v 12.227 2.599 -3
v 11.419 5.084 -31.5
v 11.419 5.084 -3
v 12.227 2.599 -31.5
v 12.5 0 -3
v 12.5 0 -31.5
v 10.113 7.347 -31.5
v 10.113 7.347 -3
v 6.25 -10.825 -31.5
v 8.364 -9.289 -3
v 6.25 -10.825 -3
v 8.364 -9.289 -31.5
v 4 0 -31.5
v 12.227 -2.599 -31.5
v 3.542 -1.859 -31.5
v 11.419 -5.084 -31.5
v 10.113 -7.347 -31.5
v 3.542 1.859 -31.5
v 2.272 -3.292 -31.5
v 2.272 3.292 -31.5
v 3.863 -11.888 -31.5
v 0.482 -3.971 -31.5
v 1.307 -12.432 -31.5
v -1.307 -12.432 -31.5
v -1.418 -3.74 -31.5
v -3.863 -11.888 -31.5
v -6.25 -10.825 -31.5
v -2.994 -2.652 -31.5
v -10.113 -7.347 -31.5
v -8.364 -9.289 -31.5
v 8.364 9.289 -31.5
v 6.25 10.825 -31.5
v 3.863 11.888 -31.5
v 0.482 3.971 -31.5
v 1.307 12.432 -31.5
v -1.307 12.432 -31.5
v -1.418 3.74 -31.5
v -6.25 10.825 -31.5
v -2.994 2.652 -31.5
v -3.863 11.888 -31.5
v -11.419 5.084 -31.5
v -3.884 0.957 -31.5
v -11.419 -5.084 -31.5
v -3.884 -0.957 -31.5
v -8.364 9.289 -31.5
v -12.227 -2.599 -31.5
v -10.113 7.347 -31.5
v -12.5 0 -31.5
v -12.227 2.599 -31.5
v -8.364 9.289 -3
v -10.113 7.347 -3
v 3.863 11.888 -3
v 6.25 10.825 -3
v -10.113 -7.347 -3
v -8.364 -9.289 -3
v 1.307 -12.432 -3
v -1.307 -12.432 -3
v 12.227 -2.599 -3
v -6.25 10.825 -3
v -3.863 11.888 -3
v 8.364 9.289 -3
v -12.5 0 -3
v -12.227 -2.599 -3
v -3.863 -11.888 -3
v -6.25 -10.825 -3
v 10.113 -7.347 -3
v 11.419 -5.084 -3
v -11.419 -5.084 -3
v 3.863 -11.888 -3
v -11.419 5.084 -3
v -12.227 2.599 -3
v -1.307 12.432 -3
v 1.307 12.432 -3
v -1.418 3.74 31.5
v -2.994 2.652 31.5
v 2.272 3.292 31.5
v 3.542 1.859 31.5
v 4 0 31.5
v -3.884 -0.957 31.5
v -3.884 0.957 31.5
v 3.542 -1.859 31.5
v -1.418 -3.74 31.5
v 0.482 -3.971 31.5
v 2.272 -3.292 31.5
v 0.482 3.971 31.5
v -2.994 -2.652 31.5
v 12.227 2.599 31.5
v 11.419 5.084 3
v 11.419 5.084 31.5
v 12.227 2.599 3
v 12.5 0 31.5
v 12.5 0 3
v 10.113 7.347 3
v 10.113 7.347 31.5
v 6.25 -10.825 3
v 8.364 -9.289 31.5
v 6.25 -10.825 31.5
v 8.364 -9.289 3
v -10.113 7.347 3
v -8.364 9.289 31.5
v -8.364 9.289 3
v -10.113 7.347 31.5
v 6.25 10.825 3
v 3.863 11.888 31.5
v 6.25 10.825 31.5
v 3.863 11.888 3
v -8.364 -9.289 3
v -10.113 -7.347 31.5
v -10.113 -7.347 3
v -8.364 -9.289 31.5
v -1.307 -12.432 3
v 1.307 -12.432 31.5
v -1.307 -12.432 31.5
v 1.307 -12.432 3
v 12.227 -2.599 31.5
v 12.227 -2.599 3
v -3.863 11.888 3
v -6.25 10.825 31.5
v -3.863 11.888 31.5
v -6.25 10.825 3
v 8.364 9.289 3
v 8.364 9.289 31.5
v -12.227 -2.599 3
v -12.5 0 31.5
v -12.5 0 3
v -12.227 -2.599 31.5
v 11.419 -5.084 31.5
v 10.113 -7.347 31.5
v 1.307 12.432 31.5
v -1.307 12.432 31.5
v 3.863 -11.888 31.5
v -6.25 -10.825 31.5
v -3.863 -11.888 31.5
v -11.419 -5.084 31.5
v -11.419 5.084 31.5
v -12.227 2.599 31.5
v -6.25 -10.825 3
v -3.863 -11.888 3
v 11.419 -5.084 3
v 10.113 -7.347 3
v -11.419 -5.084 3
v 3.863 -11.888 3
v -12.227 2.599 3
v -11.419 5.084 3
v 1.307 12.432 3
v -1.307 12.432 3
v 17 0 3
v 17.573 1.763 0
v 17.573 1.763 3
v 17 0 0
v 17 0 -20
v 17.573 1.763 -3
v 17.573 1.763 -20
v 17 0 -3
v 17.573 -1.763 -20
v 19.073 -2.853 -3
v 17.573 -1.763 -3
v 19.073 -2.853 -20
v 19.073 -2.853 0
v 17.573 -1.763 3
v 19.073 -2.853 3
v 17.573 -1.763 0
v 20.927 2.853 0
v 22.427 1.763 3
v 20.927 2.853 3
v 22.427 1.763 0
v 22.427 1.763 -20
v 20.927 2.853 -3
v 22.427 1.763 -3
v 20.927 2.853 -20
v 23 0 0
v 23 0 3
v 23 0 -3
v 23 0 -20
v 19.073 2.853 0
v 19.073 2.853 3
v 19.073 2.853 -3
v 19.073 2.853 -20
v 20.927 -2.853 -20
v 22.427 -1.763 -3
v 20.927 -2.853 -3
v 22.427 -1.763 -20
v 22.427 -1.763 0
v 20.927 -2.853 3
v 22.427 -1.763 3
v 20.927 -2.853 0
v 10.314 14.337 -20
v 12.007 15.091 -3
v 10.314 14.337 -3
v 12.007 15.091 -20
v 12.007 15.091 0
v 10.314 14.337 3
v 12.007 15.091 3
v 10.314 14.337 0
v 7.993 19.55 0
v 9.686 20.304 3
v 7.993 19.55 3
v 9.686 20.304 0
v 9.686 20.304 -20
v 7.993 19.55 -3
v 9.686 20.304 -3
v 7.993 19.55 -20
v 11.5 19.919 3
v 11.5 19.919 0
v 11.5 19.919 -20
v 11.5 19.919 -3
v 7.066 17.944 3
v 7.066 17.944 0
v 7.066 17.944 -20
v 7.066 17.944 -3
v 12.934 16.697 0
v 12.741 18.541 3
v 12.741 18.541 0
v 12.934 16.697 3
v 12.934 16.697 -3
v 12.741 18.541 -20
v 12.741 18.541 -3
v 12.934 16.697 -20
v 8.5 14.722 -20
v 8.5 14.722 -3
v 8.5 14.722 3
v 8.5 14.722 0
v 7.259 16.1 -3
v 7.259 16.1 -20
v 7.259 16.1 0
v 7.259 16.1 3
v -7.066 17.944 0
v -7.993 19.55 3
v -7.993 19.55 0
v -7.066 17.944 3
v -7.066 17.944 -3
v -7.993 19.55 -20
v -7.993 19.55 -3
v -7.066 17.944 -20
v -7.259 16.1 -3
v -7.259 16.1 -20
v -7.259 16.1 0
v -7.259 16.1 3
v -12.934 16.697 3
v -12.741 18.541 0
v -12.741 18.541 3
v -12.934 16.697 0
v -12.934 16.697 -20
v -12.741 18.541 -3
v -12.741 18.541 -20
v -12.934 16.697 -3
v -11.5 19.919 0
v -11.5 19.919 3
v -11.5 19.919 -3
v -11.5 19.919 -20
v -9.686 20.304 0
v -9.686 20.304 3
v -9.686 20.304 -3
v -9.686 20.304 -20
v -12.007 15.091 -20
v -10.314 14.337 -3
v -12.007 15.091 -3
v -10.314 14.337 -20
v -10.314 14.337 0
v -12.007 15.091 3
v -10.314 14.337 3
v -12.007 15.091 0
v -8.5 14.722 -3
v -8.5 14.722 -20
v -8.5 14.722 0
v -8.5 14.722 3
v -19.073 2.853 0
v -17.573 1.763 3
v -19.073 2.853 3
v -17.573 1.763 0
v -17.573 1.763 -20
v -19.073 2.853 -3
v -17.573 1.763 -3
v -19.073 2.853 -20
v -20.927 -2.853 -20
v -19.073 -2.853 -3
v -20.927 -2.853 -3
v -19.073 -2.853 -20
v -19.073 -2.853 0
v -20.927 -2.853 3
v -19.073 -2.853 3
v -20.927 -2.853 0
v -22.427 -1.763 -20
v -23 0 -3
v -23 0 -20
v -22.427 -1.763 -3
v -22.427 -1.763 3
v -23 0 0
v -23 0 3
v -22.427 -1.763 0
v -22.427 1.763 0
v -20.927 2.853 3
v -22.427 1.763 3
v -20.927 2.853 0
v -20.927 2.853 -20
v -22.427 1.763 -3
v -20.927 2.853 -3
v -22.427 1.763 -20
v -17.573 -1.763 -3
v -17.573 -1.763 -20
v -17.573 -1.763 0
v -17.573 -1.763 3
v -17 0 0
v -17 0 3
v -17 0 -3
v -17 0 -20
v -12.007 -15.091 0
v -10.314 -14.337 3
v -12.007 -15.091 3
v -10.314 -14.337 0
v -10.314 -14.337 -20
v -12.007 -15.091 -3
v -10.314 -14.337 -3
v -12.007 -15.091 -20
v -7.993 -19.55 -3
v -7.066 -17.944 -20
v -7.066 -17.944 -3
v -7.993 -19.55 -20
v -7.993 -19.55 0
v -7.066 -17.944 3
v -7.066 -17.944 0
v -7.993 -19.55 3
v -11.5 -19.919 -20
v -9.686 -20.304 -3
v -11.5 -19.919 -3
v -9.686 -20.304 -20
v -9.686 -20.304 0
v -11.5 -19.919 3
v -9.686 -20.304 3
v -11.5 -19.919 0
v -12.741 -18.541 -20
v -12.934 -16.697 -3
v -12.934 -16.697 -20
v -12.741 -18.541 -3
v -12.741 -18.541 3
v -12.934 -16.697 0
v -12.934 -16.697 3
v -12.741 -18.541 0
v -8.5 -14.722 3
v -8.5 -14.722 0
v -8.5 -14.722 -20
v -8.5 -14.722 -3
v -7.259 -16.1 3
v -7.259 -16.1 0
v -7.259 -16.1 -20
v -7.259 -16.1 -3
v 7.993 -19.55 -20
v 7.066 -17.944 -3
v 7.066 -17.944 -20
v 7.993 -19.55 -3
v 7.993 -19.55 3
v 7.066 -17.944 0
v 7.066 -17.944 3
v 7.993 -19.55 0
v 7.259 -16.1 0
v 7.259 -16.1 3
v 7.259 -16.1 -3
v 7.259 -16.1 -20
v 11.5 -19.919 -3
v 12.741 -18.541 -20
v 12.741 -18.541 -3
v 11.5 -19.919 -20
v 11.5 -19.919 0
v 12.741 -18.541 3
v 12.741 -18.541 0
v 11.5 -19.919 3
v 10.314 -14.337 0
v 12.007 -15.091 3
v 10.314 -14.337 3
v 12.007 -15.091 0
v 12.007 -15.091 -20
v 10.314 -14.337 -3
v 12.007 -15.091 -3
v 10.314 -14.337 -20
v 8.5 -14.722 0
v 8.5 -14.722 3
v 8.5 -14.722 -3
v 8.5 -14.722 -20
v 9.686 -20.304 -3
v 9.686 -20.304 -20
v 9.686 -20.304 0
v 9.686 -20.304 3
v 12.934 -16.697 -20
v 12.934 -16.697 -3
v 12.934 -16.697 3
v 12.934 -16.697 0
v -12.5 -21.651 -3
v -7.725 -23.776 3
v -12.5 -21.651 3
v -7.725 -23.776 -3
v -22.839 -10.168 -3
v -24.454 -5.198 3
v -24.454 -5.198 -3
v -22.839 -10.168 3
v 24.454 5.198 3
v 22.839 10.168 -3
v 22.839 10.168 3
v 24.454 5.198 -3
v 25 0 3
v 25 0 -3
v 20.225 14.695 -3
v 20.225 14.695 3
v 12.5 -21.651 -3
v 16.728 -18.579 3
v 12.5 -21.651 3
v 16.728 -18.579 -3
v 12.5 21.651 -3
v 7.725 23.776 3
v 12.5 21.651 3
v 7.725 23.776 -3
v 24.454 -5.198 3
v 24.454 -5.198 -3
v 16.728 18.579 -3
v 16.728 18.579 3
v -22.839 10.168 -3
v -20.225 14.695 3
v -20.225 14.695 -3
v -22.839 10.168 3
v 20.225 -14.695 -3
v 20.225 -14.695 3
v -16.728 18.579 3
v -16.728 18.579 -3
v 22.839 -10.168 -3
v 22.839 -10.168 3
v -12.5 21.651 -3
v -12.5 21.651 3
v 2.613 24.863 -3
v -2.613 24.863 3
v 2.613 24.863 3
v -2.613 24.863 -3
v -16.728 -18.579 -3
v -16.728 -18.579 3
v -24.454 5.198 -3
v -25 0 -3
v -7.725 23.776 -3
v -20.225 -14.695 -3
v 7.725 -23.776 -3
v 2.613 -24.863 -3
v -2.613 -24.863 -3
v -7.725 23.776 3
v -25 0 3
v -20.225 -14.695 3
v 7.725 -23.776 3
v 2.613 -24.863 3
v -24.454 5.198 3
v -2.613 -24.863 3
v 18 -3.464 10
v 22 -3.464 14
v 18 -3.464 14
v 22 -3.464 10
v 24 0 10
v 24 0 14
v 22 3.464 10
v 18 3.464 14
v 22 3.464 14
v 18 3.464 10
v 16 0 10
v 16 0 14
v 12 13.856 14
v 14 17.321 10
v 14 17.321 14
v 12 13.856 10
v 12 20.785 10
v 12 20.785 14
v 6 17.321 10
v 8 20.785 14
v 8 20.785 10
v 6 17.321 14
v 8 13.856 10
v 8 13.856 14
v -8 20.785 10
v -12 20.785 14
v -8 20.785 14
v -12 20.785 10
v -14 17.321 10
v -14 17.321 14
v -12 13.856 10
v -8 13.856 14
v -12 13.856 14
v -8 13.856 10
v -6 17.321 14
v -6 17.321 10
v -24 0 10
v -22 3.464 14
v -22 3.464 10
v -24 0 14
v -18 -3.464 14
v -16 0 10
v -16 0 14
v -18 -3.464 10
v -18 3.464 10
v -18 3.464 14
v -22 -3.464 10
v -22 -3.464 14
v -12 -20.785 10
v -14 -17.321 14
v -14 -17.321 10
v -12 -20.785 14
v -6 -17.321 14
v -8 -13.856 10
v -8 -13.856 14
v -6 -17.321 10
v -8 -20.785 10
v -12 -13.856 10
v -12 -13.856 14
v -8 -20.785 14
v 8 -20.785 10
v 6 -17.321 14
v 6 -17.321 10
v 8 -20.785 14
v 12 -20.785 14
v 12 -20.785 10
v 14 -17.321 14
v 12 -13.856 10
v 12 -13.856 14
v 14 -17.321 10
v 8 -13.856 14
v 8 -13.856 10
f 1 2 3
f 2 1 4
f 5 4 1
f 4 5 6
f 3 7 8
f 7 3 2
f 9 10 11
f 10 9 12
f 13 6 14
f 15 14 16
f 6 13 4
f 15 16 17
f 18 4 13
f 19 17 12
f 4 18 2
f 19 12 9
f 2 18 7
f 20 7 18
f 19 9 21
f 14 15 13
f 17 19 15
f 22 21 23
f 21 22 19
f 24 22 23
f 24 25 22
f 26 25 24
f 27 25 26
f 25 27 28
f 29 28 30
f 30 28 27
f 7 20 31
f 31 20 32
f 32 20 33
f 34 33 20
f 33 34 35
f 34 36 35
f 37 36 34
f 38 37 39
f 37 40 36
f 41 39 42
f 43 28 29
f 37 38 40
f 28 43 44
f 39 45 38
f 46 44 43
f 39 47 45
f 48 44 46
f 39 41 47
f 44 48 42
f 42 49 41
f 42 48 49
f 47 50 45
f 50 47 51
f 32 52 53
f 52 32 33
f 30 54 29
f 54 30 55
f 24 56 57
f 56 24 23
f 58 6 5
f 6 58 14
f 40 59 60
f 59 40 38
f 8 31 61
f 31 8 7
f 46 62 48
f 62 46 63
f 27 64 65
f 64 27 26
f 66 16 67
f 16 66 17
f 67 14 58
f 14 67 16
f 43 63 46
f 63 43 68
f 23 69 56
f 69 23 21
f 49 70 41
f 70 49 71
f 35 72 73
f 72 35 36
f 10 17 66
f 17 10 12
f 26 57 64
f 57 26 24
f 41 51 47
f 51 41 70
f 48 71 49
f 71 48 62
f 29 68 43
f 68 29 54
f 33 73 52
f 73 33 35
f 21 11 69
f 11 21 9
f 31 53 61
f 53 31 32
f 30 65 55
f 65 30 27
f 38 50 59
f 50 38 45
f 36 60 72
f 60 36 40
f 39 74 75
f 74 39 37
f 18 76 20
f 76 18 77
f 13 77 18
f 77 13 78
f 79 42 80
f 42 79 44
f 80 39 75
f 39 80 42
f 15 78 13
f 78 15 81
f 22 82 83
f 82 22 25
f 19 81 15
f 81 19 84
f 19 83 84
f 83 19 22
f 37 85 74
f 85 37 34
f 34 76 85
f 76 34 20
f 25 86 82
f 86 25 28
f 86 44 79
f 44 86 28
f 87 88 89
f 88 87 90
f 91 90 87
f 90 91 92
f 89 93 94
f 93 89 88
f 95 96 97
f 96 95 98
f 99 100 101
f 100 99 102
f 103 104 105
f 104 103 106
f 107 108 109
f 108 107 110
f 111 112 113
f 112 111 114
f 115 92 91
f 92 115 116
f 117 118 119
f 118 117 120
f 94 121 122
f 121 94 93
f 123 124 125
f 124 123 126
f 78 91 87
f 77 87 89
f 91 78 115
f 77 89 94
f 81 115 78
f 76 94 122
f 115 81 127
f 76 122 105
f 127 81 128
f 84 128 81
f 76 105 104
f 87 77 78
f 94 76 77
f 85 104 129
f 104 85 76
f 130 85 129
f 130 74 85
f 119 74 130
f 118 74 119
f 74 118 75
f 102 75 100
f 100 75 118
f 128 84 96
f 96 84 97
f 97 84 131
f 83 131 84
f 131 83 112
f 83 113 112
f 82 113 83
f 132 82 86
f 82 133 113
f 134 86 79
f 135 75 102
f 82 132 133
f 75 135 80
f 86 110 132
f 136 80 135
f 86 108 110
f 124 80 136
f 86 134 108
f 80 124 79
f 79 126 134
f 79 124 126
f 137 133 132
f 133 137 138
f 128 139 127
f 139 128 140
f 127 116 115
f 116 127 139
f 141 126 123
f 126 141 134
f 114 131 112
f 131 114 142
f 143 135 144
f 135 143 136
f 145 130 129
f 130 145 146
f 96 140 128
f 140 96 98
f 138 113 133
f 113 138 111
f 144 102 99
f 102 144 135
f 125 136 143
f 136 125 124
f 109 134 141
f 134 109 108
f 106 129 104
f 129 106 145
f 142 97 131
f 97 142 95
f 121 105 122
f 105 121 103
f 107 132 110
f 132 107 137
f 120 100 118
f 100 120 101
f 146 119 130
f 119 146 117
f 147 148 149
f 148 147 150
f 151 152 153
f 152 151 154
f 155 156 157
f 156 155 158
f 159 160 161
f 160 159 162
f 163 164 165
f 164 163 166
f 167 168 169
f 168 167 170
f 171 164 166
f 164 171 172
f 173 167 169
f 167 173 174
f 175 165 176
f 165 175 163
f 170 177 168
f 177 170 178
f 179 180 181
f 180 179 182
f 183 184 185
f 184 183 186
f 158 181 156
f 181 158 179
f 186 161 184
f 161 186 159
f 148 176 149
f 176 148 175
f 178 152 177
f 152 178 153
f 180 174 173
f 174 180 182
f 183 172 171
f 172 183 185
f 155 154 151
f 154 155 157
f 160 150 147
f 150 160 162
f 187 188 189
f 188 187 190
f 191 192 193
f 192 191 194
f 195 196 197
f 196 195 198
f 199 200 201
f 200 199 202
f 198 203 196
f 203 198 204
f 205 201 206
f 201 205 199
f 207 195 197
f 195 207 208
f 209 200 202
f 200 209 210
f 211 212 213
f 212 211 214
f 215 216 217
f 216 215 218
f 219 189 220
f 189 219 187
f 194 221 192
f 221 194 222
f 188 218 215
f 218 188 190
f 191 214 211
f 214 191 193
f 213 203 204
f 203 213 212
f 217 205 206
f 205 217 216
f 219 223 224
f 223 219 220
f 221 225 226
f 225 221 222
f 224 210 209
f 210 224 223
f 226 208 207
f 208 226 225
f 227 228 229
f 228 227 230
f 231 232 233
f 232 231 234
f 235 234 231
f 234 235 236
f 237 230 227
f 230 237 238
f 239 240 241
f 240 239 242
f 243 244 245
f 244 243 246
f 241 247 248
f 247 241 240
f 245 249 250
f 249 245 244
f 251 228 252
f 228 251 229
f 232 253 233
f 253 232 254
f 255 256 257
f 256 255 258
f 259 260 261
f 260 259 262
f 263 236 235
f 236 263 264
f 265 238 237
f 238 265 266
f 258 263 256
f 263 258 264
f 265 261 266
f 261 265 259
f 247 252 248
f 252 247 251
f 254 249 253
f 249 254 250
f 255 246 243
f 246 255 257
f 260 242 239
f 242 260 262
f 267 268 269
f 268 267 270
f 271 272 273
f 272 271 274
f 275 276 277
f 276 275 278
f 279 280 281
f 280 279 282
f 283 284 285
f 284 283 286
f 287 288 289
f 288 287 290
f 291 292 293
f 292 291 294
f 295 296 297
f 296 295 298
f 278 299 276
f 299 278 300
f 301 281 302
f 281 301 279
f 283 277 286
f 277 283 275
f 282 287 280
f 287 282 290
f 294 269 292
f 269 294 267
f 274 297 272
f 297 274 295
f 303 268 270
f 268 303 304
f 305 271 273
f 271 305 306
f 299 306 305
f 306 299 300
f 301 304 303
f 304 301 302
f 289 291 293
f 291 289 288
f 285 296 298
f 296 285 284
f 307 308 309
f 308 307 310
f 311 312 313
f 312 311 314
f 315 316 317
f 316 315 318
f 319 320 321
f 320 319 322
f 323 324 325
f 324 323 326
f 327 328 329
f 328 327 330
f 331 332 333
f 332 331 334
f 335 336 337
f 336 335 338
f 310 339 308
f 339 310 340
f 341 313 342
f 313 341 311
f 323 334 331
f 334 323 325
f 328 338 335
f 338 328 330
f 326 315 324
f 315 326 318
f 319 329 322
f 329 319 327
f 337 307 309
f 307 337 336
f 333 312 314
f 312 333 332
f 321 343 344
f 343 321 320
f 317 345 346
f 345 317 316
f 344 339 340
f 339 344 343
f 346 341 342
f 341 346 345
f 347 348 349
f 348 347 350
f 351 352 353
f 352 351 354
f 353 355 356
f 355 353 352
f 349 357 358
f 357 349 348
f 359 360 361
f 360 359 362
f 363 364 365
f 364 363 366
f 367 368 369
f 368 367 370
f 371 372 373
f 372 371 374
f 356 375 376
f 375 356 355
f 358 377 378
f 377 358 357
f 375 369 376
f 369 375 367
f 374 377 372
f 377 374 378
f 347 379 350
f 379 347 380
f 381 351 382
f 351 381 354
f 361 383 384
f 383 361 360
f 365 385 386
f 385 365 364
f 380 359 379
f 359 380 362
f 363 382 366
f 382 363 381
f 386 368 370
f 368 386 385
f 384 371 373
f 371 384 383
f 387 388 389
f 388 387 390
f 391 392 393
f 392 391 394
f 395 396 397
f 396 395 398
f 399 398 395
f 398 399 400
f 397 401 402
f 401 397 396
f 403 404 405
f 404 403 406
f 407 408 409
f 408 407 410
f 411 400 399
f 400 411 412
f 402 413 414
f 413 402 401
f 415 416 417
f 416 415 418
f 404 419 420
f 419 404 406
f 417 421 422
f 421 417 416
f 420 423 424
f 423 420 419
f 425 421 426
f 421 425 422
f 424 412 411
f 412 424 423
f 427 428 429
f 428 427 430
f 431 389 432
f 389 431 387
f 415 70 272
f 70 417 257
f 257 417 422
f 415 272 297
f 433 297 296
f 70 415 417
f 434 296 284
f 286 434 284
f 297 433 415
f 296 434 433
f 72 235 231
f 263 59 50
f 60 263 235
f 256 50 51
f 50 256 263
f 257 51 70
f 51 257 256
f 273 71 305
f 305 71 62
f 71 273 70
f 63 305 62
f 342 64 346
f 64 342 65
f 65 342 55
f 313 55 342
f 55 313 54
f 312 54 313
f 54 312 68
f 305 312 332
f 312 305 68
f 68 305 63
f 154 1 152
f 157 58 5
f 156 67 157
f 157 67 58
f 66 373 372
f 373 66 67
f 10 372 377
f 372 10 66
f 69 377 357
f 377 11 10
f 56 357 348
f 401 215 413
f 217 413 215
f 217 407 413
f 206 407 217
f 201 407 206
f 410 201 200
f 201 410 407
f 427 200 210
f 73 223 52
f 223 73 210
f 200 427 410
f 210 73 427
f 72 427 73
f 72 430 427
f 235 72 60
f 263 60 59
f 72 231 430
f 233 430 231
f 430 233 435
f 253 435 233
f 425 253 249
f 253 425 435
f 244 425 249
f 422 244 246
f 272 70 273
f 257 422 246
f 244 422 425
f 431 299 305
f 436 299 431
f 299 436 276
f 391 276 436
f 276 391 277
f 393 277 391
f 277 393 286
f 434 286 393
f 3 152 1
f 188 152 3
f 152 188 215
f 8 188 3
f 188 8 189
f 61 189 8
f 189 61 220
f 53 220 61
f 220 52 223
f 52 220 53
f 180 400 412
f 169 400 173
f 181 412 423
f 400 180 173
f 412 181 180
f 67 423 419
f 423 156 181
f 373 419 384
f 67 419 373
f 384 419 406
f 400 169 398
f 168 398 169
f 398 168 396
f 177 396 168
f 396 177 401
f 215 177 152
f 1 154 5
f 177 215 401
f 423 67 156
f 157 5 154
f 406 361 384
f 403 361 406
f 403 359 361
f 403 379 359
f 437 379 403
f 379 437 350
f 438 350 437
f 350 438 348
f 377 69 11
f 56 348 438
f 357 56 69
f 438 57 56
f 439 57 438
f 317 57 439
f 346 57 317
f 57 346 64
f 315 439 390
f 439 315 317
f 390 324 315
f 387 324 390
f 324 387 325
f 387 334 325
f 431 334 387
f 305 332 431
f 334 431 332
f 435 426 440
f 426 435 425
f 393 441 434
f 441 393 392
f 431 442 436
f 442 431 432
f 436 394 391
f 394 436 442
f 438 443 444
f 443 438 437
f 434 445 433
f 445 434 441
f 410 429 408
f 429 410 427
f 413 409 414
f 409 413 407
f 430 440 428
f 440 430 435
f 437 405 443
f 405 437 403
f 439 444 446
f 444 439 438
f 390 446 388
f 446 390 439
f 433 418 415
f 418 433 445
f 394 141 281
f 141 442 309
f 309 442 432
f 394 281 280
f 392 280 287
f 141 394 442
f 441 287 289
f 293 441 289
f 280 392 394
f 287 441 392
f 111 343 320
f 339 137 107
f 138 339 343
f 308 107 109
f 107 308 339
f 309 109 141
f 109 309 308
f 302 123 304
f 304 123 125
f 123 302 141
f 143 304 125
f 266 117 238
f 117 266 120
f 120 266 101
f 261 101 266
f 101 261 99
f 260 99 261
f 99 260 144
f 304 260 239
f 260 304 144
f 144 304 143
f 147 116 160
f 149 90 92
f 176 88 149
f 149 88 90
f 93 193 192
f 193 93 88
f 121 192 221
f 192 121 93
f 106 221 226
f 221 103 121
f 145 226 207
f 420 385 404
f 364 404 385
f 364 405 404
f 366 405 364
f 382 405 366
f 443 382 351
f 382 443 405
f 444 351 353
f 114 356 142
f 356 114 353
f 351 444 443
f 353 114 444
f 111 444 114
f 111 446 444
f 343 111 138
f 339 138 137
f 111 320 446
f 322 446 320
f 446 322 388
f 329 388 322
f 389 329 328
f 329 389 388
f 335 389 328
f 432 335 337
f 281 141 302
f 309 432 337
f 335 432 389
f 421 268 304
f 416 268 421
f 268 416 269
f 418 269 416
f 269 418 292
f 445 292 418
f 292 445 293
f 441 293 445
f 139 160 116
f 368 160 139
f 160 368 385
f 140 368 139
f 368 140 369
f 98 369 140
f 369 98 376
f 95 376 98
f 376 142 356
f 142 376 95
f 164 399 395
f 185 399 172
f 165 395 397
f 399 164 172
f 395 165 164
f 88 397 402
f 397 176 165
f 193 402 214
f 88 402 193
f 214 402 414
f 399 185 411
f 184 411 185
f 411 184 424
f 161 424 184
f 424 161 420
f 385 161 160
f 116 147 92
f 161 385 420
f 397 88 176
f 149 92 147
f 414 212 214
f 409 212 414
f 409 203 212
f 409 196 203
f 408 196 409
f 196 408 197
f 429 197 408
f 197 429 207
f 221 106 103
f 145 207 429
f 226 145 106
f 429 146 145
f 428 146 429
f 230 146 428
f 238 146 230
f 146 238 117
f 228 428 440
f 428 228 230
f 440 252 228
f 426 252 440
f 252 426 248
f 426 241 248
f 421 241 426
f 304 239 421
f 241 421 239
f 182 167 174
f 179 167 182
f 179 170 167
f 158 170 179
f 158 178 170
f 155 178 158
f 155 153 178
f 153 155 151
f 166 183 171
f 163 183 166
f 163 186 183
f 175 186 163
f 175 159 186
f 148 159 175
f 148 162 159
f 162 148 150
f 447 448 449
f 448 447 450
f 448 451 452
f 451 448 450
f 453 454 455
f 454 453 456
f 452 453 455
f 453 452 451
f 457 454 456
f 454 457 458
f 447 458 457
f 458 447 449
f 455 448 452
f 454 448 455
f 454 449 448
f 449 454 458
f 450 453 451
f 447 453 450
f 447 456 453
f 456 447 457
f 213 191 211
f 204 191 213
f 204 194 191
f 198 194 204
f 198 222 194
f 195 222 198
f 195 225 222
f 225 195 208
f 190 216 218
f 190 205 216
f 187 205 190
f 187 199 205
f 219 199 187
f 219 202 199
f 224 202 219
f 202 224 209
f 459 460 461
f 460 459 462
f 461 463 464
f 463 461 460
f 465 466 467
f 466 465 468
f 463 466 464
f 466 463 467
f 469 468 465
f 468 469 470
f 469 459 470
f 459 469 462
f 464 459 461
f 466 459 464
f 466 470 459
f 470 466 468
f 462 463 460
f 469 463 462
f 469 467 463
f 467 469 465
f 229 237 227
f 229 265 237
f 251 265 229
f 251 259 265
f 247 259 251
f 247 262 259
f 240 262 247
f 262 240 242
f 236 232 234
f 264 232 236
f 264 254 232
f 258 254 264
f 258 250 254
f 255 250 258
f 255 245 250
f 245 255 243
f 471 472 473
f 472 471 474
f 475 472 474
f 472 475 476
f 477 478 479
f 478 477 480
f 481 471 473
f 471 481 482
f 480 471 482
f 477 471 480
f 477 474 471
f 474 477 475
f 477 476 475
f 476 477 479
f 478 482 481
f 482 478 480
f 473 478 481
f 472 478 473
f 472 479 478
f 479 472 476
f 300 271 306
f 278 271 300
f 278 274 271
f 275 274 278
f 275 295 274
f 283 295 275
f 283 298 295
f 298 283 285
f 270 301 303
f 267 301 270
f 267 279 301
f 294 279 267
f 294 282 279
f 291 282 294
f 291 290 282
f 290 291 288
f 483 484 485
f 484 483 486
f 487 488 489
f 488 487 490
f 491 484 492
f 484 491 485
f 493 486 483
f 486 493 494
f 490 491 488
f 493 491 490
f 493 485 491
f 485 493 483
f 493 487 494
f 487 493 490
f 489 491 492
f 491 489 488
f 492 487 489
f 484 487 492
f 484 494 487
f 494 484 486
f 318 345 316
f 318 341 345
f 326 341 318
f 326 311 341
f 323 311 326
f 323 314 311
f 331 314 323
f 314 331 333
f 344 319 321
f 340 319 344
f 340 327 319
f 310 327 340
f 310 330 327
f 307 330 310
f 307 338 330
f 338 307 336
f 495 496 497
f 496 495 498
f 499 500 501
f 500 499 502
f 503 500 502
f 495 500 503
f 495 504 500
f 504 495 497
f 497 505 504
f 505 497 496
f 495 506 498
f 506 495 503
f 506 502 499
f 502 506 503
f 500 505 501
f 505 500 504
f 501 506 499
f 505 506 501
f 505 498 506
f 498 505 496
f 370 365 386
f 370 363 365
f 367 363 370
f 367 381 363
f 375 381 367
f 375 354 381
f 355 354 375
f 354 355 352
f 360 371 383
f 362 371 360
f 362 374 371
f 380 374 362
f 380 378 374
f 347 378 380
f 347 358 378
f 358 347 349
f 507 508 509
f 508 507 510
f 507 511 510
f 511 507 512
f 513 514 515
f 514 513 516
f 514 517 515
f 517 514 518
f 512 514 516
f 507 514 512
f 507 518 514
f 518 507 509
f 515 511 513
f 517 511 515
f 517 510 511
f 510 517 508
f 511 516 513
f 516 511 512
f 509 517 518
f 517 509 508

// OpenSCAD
// Parameters
shaft_length = 30; // Shortened shaft
shaft_diameter = 25; // Increased diameter
shaft_hole_diameter = 8;

flange_diameter = 50;
flange_thickness = 3; // Thinner flange
flange_hole_diameter = 8;
bolt_hole_radius = 3;
bolt_spacing_radius = 20;

diaphragm_thickness = 2; // Ensure diaphragm is present

bolt_length = 20; // Shortened bolts
bolt_diameter = 6;
nut_size = 8; // More compact nuts

// Shaft Module
module shaft() {
    difference() {
        cylinder(h = shaft_length, d = shaft_diameter, center = true);
        cylinder(h = shaft_length + 2, d = shaft_hole_diameter, center = true);
    }
}

// Flange Module
module flange() {
    difference() {
        cylinder(h = flange_thickness, d = flange_diameter, center = true);
        cylinder(h = flange_thickness + 2, d = flange_hole_diameter, center = true);
        for (i = [0:60:360]) {
            rotate([0, 0, i])
            translate([bolt_spacing_radius, 0, 0])
            cylinder(h = flange_thickness + 2, d = bolt_hole_radius * 2, center = true);
        }
    }
}

// Diaphragm Module
module diaphragm() {
    difference() {
        cylinder(h = diaphragm_thickness, d = flange_diameter - 5, center = true);
        cylinder(h = diaphragm_thickness + 2, d = flange_hole_diameter, center = true);
        for (i = [0:60:360]) {
            rotate([0, 0, i])
            translate([bolt_spacing_radius, 0, 0])
            cylinder(h = diaphragm_thickness + 2, d = bolt_hole_radius * 2, center = true);
        }
    }
}

// Bolt Module
module bolt() {
    cylinder(h = bolt_length, d = bolt_diameter, center = true);
}

// Nut Module
module nut() {
    cylinder(h = nut_size / 2, d = nut_size, $fn = 6);
}

// Assembly
module coupling() {
    translate([0, 0, -shaft_length / 2 - flange_thickness / 2])
    shaft();
    
    translate([0, 0, shaft_length / 2 + flange_thickness / 2])
    shaft();
    
    translate([0, 0, -flange_thickness / 2])
    flange();
    
    translate([0, 0, flange_thickness / 2])
    flange();
    
    translate([0, 0, 0])
    diaphragm();
    
    for (i = [0:60:360]) {
        rotate([0, 0, i])
        translate([bolt_spacing_radius, 0, -bolt_length / 2])
        bolt();
        
        rotate([0, 0, i])
        translate([bolt_spacing_radius, 0, bolt_length / 2])
        nut();
    }
}

// Render the coupling
coupling();
